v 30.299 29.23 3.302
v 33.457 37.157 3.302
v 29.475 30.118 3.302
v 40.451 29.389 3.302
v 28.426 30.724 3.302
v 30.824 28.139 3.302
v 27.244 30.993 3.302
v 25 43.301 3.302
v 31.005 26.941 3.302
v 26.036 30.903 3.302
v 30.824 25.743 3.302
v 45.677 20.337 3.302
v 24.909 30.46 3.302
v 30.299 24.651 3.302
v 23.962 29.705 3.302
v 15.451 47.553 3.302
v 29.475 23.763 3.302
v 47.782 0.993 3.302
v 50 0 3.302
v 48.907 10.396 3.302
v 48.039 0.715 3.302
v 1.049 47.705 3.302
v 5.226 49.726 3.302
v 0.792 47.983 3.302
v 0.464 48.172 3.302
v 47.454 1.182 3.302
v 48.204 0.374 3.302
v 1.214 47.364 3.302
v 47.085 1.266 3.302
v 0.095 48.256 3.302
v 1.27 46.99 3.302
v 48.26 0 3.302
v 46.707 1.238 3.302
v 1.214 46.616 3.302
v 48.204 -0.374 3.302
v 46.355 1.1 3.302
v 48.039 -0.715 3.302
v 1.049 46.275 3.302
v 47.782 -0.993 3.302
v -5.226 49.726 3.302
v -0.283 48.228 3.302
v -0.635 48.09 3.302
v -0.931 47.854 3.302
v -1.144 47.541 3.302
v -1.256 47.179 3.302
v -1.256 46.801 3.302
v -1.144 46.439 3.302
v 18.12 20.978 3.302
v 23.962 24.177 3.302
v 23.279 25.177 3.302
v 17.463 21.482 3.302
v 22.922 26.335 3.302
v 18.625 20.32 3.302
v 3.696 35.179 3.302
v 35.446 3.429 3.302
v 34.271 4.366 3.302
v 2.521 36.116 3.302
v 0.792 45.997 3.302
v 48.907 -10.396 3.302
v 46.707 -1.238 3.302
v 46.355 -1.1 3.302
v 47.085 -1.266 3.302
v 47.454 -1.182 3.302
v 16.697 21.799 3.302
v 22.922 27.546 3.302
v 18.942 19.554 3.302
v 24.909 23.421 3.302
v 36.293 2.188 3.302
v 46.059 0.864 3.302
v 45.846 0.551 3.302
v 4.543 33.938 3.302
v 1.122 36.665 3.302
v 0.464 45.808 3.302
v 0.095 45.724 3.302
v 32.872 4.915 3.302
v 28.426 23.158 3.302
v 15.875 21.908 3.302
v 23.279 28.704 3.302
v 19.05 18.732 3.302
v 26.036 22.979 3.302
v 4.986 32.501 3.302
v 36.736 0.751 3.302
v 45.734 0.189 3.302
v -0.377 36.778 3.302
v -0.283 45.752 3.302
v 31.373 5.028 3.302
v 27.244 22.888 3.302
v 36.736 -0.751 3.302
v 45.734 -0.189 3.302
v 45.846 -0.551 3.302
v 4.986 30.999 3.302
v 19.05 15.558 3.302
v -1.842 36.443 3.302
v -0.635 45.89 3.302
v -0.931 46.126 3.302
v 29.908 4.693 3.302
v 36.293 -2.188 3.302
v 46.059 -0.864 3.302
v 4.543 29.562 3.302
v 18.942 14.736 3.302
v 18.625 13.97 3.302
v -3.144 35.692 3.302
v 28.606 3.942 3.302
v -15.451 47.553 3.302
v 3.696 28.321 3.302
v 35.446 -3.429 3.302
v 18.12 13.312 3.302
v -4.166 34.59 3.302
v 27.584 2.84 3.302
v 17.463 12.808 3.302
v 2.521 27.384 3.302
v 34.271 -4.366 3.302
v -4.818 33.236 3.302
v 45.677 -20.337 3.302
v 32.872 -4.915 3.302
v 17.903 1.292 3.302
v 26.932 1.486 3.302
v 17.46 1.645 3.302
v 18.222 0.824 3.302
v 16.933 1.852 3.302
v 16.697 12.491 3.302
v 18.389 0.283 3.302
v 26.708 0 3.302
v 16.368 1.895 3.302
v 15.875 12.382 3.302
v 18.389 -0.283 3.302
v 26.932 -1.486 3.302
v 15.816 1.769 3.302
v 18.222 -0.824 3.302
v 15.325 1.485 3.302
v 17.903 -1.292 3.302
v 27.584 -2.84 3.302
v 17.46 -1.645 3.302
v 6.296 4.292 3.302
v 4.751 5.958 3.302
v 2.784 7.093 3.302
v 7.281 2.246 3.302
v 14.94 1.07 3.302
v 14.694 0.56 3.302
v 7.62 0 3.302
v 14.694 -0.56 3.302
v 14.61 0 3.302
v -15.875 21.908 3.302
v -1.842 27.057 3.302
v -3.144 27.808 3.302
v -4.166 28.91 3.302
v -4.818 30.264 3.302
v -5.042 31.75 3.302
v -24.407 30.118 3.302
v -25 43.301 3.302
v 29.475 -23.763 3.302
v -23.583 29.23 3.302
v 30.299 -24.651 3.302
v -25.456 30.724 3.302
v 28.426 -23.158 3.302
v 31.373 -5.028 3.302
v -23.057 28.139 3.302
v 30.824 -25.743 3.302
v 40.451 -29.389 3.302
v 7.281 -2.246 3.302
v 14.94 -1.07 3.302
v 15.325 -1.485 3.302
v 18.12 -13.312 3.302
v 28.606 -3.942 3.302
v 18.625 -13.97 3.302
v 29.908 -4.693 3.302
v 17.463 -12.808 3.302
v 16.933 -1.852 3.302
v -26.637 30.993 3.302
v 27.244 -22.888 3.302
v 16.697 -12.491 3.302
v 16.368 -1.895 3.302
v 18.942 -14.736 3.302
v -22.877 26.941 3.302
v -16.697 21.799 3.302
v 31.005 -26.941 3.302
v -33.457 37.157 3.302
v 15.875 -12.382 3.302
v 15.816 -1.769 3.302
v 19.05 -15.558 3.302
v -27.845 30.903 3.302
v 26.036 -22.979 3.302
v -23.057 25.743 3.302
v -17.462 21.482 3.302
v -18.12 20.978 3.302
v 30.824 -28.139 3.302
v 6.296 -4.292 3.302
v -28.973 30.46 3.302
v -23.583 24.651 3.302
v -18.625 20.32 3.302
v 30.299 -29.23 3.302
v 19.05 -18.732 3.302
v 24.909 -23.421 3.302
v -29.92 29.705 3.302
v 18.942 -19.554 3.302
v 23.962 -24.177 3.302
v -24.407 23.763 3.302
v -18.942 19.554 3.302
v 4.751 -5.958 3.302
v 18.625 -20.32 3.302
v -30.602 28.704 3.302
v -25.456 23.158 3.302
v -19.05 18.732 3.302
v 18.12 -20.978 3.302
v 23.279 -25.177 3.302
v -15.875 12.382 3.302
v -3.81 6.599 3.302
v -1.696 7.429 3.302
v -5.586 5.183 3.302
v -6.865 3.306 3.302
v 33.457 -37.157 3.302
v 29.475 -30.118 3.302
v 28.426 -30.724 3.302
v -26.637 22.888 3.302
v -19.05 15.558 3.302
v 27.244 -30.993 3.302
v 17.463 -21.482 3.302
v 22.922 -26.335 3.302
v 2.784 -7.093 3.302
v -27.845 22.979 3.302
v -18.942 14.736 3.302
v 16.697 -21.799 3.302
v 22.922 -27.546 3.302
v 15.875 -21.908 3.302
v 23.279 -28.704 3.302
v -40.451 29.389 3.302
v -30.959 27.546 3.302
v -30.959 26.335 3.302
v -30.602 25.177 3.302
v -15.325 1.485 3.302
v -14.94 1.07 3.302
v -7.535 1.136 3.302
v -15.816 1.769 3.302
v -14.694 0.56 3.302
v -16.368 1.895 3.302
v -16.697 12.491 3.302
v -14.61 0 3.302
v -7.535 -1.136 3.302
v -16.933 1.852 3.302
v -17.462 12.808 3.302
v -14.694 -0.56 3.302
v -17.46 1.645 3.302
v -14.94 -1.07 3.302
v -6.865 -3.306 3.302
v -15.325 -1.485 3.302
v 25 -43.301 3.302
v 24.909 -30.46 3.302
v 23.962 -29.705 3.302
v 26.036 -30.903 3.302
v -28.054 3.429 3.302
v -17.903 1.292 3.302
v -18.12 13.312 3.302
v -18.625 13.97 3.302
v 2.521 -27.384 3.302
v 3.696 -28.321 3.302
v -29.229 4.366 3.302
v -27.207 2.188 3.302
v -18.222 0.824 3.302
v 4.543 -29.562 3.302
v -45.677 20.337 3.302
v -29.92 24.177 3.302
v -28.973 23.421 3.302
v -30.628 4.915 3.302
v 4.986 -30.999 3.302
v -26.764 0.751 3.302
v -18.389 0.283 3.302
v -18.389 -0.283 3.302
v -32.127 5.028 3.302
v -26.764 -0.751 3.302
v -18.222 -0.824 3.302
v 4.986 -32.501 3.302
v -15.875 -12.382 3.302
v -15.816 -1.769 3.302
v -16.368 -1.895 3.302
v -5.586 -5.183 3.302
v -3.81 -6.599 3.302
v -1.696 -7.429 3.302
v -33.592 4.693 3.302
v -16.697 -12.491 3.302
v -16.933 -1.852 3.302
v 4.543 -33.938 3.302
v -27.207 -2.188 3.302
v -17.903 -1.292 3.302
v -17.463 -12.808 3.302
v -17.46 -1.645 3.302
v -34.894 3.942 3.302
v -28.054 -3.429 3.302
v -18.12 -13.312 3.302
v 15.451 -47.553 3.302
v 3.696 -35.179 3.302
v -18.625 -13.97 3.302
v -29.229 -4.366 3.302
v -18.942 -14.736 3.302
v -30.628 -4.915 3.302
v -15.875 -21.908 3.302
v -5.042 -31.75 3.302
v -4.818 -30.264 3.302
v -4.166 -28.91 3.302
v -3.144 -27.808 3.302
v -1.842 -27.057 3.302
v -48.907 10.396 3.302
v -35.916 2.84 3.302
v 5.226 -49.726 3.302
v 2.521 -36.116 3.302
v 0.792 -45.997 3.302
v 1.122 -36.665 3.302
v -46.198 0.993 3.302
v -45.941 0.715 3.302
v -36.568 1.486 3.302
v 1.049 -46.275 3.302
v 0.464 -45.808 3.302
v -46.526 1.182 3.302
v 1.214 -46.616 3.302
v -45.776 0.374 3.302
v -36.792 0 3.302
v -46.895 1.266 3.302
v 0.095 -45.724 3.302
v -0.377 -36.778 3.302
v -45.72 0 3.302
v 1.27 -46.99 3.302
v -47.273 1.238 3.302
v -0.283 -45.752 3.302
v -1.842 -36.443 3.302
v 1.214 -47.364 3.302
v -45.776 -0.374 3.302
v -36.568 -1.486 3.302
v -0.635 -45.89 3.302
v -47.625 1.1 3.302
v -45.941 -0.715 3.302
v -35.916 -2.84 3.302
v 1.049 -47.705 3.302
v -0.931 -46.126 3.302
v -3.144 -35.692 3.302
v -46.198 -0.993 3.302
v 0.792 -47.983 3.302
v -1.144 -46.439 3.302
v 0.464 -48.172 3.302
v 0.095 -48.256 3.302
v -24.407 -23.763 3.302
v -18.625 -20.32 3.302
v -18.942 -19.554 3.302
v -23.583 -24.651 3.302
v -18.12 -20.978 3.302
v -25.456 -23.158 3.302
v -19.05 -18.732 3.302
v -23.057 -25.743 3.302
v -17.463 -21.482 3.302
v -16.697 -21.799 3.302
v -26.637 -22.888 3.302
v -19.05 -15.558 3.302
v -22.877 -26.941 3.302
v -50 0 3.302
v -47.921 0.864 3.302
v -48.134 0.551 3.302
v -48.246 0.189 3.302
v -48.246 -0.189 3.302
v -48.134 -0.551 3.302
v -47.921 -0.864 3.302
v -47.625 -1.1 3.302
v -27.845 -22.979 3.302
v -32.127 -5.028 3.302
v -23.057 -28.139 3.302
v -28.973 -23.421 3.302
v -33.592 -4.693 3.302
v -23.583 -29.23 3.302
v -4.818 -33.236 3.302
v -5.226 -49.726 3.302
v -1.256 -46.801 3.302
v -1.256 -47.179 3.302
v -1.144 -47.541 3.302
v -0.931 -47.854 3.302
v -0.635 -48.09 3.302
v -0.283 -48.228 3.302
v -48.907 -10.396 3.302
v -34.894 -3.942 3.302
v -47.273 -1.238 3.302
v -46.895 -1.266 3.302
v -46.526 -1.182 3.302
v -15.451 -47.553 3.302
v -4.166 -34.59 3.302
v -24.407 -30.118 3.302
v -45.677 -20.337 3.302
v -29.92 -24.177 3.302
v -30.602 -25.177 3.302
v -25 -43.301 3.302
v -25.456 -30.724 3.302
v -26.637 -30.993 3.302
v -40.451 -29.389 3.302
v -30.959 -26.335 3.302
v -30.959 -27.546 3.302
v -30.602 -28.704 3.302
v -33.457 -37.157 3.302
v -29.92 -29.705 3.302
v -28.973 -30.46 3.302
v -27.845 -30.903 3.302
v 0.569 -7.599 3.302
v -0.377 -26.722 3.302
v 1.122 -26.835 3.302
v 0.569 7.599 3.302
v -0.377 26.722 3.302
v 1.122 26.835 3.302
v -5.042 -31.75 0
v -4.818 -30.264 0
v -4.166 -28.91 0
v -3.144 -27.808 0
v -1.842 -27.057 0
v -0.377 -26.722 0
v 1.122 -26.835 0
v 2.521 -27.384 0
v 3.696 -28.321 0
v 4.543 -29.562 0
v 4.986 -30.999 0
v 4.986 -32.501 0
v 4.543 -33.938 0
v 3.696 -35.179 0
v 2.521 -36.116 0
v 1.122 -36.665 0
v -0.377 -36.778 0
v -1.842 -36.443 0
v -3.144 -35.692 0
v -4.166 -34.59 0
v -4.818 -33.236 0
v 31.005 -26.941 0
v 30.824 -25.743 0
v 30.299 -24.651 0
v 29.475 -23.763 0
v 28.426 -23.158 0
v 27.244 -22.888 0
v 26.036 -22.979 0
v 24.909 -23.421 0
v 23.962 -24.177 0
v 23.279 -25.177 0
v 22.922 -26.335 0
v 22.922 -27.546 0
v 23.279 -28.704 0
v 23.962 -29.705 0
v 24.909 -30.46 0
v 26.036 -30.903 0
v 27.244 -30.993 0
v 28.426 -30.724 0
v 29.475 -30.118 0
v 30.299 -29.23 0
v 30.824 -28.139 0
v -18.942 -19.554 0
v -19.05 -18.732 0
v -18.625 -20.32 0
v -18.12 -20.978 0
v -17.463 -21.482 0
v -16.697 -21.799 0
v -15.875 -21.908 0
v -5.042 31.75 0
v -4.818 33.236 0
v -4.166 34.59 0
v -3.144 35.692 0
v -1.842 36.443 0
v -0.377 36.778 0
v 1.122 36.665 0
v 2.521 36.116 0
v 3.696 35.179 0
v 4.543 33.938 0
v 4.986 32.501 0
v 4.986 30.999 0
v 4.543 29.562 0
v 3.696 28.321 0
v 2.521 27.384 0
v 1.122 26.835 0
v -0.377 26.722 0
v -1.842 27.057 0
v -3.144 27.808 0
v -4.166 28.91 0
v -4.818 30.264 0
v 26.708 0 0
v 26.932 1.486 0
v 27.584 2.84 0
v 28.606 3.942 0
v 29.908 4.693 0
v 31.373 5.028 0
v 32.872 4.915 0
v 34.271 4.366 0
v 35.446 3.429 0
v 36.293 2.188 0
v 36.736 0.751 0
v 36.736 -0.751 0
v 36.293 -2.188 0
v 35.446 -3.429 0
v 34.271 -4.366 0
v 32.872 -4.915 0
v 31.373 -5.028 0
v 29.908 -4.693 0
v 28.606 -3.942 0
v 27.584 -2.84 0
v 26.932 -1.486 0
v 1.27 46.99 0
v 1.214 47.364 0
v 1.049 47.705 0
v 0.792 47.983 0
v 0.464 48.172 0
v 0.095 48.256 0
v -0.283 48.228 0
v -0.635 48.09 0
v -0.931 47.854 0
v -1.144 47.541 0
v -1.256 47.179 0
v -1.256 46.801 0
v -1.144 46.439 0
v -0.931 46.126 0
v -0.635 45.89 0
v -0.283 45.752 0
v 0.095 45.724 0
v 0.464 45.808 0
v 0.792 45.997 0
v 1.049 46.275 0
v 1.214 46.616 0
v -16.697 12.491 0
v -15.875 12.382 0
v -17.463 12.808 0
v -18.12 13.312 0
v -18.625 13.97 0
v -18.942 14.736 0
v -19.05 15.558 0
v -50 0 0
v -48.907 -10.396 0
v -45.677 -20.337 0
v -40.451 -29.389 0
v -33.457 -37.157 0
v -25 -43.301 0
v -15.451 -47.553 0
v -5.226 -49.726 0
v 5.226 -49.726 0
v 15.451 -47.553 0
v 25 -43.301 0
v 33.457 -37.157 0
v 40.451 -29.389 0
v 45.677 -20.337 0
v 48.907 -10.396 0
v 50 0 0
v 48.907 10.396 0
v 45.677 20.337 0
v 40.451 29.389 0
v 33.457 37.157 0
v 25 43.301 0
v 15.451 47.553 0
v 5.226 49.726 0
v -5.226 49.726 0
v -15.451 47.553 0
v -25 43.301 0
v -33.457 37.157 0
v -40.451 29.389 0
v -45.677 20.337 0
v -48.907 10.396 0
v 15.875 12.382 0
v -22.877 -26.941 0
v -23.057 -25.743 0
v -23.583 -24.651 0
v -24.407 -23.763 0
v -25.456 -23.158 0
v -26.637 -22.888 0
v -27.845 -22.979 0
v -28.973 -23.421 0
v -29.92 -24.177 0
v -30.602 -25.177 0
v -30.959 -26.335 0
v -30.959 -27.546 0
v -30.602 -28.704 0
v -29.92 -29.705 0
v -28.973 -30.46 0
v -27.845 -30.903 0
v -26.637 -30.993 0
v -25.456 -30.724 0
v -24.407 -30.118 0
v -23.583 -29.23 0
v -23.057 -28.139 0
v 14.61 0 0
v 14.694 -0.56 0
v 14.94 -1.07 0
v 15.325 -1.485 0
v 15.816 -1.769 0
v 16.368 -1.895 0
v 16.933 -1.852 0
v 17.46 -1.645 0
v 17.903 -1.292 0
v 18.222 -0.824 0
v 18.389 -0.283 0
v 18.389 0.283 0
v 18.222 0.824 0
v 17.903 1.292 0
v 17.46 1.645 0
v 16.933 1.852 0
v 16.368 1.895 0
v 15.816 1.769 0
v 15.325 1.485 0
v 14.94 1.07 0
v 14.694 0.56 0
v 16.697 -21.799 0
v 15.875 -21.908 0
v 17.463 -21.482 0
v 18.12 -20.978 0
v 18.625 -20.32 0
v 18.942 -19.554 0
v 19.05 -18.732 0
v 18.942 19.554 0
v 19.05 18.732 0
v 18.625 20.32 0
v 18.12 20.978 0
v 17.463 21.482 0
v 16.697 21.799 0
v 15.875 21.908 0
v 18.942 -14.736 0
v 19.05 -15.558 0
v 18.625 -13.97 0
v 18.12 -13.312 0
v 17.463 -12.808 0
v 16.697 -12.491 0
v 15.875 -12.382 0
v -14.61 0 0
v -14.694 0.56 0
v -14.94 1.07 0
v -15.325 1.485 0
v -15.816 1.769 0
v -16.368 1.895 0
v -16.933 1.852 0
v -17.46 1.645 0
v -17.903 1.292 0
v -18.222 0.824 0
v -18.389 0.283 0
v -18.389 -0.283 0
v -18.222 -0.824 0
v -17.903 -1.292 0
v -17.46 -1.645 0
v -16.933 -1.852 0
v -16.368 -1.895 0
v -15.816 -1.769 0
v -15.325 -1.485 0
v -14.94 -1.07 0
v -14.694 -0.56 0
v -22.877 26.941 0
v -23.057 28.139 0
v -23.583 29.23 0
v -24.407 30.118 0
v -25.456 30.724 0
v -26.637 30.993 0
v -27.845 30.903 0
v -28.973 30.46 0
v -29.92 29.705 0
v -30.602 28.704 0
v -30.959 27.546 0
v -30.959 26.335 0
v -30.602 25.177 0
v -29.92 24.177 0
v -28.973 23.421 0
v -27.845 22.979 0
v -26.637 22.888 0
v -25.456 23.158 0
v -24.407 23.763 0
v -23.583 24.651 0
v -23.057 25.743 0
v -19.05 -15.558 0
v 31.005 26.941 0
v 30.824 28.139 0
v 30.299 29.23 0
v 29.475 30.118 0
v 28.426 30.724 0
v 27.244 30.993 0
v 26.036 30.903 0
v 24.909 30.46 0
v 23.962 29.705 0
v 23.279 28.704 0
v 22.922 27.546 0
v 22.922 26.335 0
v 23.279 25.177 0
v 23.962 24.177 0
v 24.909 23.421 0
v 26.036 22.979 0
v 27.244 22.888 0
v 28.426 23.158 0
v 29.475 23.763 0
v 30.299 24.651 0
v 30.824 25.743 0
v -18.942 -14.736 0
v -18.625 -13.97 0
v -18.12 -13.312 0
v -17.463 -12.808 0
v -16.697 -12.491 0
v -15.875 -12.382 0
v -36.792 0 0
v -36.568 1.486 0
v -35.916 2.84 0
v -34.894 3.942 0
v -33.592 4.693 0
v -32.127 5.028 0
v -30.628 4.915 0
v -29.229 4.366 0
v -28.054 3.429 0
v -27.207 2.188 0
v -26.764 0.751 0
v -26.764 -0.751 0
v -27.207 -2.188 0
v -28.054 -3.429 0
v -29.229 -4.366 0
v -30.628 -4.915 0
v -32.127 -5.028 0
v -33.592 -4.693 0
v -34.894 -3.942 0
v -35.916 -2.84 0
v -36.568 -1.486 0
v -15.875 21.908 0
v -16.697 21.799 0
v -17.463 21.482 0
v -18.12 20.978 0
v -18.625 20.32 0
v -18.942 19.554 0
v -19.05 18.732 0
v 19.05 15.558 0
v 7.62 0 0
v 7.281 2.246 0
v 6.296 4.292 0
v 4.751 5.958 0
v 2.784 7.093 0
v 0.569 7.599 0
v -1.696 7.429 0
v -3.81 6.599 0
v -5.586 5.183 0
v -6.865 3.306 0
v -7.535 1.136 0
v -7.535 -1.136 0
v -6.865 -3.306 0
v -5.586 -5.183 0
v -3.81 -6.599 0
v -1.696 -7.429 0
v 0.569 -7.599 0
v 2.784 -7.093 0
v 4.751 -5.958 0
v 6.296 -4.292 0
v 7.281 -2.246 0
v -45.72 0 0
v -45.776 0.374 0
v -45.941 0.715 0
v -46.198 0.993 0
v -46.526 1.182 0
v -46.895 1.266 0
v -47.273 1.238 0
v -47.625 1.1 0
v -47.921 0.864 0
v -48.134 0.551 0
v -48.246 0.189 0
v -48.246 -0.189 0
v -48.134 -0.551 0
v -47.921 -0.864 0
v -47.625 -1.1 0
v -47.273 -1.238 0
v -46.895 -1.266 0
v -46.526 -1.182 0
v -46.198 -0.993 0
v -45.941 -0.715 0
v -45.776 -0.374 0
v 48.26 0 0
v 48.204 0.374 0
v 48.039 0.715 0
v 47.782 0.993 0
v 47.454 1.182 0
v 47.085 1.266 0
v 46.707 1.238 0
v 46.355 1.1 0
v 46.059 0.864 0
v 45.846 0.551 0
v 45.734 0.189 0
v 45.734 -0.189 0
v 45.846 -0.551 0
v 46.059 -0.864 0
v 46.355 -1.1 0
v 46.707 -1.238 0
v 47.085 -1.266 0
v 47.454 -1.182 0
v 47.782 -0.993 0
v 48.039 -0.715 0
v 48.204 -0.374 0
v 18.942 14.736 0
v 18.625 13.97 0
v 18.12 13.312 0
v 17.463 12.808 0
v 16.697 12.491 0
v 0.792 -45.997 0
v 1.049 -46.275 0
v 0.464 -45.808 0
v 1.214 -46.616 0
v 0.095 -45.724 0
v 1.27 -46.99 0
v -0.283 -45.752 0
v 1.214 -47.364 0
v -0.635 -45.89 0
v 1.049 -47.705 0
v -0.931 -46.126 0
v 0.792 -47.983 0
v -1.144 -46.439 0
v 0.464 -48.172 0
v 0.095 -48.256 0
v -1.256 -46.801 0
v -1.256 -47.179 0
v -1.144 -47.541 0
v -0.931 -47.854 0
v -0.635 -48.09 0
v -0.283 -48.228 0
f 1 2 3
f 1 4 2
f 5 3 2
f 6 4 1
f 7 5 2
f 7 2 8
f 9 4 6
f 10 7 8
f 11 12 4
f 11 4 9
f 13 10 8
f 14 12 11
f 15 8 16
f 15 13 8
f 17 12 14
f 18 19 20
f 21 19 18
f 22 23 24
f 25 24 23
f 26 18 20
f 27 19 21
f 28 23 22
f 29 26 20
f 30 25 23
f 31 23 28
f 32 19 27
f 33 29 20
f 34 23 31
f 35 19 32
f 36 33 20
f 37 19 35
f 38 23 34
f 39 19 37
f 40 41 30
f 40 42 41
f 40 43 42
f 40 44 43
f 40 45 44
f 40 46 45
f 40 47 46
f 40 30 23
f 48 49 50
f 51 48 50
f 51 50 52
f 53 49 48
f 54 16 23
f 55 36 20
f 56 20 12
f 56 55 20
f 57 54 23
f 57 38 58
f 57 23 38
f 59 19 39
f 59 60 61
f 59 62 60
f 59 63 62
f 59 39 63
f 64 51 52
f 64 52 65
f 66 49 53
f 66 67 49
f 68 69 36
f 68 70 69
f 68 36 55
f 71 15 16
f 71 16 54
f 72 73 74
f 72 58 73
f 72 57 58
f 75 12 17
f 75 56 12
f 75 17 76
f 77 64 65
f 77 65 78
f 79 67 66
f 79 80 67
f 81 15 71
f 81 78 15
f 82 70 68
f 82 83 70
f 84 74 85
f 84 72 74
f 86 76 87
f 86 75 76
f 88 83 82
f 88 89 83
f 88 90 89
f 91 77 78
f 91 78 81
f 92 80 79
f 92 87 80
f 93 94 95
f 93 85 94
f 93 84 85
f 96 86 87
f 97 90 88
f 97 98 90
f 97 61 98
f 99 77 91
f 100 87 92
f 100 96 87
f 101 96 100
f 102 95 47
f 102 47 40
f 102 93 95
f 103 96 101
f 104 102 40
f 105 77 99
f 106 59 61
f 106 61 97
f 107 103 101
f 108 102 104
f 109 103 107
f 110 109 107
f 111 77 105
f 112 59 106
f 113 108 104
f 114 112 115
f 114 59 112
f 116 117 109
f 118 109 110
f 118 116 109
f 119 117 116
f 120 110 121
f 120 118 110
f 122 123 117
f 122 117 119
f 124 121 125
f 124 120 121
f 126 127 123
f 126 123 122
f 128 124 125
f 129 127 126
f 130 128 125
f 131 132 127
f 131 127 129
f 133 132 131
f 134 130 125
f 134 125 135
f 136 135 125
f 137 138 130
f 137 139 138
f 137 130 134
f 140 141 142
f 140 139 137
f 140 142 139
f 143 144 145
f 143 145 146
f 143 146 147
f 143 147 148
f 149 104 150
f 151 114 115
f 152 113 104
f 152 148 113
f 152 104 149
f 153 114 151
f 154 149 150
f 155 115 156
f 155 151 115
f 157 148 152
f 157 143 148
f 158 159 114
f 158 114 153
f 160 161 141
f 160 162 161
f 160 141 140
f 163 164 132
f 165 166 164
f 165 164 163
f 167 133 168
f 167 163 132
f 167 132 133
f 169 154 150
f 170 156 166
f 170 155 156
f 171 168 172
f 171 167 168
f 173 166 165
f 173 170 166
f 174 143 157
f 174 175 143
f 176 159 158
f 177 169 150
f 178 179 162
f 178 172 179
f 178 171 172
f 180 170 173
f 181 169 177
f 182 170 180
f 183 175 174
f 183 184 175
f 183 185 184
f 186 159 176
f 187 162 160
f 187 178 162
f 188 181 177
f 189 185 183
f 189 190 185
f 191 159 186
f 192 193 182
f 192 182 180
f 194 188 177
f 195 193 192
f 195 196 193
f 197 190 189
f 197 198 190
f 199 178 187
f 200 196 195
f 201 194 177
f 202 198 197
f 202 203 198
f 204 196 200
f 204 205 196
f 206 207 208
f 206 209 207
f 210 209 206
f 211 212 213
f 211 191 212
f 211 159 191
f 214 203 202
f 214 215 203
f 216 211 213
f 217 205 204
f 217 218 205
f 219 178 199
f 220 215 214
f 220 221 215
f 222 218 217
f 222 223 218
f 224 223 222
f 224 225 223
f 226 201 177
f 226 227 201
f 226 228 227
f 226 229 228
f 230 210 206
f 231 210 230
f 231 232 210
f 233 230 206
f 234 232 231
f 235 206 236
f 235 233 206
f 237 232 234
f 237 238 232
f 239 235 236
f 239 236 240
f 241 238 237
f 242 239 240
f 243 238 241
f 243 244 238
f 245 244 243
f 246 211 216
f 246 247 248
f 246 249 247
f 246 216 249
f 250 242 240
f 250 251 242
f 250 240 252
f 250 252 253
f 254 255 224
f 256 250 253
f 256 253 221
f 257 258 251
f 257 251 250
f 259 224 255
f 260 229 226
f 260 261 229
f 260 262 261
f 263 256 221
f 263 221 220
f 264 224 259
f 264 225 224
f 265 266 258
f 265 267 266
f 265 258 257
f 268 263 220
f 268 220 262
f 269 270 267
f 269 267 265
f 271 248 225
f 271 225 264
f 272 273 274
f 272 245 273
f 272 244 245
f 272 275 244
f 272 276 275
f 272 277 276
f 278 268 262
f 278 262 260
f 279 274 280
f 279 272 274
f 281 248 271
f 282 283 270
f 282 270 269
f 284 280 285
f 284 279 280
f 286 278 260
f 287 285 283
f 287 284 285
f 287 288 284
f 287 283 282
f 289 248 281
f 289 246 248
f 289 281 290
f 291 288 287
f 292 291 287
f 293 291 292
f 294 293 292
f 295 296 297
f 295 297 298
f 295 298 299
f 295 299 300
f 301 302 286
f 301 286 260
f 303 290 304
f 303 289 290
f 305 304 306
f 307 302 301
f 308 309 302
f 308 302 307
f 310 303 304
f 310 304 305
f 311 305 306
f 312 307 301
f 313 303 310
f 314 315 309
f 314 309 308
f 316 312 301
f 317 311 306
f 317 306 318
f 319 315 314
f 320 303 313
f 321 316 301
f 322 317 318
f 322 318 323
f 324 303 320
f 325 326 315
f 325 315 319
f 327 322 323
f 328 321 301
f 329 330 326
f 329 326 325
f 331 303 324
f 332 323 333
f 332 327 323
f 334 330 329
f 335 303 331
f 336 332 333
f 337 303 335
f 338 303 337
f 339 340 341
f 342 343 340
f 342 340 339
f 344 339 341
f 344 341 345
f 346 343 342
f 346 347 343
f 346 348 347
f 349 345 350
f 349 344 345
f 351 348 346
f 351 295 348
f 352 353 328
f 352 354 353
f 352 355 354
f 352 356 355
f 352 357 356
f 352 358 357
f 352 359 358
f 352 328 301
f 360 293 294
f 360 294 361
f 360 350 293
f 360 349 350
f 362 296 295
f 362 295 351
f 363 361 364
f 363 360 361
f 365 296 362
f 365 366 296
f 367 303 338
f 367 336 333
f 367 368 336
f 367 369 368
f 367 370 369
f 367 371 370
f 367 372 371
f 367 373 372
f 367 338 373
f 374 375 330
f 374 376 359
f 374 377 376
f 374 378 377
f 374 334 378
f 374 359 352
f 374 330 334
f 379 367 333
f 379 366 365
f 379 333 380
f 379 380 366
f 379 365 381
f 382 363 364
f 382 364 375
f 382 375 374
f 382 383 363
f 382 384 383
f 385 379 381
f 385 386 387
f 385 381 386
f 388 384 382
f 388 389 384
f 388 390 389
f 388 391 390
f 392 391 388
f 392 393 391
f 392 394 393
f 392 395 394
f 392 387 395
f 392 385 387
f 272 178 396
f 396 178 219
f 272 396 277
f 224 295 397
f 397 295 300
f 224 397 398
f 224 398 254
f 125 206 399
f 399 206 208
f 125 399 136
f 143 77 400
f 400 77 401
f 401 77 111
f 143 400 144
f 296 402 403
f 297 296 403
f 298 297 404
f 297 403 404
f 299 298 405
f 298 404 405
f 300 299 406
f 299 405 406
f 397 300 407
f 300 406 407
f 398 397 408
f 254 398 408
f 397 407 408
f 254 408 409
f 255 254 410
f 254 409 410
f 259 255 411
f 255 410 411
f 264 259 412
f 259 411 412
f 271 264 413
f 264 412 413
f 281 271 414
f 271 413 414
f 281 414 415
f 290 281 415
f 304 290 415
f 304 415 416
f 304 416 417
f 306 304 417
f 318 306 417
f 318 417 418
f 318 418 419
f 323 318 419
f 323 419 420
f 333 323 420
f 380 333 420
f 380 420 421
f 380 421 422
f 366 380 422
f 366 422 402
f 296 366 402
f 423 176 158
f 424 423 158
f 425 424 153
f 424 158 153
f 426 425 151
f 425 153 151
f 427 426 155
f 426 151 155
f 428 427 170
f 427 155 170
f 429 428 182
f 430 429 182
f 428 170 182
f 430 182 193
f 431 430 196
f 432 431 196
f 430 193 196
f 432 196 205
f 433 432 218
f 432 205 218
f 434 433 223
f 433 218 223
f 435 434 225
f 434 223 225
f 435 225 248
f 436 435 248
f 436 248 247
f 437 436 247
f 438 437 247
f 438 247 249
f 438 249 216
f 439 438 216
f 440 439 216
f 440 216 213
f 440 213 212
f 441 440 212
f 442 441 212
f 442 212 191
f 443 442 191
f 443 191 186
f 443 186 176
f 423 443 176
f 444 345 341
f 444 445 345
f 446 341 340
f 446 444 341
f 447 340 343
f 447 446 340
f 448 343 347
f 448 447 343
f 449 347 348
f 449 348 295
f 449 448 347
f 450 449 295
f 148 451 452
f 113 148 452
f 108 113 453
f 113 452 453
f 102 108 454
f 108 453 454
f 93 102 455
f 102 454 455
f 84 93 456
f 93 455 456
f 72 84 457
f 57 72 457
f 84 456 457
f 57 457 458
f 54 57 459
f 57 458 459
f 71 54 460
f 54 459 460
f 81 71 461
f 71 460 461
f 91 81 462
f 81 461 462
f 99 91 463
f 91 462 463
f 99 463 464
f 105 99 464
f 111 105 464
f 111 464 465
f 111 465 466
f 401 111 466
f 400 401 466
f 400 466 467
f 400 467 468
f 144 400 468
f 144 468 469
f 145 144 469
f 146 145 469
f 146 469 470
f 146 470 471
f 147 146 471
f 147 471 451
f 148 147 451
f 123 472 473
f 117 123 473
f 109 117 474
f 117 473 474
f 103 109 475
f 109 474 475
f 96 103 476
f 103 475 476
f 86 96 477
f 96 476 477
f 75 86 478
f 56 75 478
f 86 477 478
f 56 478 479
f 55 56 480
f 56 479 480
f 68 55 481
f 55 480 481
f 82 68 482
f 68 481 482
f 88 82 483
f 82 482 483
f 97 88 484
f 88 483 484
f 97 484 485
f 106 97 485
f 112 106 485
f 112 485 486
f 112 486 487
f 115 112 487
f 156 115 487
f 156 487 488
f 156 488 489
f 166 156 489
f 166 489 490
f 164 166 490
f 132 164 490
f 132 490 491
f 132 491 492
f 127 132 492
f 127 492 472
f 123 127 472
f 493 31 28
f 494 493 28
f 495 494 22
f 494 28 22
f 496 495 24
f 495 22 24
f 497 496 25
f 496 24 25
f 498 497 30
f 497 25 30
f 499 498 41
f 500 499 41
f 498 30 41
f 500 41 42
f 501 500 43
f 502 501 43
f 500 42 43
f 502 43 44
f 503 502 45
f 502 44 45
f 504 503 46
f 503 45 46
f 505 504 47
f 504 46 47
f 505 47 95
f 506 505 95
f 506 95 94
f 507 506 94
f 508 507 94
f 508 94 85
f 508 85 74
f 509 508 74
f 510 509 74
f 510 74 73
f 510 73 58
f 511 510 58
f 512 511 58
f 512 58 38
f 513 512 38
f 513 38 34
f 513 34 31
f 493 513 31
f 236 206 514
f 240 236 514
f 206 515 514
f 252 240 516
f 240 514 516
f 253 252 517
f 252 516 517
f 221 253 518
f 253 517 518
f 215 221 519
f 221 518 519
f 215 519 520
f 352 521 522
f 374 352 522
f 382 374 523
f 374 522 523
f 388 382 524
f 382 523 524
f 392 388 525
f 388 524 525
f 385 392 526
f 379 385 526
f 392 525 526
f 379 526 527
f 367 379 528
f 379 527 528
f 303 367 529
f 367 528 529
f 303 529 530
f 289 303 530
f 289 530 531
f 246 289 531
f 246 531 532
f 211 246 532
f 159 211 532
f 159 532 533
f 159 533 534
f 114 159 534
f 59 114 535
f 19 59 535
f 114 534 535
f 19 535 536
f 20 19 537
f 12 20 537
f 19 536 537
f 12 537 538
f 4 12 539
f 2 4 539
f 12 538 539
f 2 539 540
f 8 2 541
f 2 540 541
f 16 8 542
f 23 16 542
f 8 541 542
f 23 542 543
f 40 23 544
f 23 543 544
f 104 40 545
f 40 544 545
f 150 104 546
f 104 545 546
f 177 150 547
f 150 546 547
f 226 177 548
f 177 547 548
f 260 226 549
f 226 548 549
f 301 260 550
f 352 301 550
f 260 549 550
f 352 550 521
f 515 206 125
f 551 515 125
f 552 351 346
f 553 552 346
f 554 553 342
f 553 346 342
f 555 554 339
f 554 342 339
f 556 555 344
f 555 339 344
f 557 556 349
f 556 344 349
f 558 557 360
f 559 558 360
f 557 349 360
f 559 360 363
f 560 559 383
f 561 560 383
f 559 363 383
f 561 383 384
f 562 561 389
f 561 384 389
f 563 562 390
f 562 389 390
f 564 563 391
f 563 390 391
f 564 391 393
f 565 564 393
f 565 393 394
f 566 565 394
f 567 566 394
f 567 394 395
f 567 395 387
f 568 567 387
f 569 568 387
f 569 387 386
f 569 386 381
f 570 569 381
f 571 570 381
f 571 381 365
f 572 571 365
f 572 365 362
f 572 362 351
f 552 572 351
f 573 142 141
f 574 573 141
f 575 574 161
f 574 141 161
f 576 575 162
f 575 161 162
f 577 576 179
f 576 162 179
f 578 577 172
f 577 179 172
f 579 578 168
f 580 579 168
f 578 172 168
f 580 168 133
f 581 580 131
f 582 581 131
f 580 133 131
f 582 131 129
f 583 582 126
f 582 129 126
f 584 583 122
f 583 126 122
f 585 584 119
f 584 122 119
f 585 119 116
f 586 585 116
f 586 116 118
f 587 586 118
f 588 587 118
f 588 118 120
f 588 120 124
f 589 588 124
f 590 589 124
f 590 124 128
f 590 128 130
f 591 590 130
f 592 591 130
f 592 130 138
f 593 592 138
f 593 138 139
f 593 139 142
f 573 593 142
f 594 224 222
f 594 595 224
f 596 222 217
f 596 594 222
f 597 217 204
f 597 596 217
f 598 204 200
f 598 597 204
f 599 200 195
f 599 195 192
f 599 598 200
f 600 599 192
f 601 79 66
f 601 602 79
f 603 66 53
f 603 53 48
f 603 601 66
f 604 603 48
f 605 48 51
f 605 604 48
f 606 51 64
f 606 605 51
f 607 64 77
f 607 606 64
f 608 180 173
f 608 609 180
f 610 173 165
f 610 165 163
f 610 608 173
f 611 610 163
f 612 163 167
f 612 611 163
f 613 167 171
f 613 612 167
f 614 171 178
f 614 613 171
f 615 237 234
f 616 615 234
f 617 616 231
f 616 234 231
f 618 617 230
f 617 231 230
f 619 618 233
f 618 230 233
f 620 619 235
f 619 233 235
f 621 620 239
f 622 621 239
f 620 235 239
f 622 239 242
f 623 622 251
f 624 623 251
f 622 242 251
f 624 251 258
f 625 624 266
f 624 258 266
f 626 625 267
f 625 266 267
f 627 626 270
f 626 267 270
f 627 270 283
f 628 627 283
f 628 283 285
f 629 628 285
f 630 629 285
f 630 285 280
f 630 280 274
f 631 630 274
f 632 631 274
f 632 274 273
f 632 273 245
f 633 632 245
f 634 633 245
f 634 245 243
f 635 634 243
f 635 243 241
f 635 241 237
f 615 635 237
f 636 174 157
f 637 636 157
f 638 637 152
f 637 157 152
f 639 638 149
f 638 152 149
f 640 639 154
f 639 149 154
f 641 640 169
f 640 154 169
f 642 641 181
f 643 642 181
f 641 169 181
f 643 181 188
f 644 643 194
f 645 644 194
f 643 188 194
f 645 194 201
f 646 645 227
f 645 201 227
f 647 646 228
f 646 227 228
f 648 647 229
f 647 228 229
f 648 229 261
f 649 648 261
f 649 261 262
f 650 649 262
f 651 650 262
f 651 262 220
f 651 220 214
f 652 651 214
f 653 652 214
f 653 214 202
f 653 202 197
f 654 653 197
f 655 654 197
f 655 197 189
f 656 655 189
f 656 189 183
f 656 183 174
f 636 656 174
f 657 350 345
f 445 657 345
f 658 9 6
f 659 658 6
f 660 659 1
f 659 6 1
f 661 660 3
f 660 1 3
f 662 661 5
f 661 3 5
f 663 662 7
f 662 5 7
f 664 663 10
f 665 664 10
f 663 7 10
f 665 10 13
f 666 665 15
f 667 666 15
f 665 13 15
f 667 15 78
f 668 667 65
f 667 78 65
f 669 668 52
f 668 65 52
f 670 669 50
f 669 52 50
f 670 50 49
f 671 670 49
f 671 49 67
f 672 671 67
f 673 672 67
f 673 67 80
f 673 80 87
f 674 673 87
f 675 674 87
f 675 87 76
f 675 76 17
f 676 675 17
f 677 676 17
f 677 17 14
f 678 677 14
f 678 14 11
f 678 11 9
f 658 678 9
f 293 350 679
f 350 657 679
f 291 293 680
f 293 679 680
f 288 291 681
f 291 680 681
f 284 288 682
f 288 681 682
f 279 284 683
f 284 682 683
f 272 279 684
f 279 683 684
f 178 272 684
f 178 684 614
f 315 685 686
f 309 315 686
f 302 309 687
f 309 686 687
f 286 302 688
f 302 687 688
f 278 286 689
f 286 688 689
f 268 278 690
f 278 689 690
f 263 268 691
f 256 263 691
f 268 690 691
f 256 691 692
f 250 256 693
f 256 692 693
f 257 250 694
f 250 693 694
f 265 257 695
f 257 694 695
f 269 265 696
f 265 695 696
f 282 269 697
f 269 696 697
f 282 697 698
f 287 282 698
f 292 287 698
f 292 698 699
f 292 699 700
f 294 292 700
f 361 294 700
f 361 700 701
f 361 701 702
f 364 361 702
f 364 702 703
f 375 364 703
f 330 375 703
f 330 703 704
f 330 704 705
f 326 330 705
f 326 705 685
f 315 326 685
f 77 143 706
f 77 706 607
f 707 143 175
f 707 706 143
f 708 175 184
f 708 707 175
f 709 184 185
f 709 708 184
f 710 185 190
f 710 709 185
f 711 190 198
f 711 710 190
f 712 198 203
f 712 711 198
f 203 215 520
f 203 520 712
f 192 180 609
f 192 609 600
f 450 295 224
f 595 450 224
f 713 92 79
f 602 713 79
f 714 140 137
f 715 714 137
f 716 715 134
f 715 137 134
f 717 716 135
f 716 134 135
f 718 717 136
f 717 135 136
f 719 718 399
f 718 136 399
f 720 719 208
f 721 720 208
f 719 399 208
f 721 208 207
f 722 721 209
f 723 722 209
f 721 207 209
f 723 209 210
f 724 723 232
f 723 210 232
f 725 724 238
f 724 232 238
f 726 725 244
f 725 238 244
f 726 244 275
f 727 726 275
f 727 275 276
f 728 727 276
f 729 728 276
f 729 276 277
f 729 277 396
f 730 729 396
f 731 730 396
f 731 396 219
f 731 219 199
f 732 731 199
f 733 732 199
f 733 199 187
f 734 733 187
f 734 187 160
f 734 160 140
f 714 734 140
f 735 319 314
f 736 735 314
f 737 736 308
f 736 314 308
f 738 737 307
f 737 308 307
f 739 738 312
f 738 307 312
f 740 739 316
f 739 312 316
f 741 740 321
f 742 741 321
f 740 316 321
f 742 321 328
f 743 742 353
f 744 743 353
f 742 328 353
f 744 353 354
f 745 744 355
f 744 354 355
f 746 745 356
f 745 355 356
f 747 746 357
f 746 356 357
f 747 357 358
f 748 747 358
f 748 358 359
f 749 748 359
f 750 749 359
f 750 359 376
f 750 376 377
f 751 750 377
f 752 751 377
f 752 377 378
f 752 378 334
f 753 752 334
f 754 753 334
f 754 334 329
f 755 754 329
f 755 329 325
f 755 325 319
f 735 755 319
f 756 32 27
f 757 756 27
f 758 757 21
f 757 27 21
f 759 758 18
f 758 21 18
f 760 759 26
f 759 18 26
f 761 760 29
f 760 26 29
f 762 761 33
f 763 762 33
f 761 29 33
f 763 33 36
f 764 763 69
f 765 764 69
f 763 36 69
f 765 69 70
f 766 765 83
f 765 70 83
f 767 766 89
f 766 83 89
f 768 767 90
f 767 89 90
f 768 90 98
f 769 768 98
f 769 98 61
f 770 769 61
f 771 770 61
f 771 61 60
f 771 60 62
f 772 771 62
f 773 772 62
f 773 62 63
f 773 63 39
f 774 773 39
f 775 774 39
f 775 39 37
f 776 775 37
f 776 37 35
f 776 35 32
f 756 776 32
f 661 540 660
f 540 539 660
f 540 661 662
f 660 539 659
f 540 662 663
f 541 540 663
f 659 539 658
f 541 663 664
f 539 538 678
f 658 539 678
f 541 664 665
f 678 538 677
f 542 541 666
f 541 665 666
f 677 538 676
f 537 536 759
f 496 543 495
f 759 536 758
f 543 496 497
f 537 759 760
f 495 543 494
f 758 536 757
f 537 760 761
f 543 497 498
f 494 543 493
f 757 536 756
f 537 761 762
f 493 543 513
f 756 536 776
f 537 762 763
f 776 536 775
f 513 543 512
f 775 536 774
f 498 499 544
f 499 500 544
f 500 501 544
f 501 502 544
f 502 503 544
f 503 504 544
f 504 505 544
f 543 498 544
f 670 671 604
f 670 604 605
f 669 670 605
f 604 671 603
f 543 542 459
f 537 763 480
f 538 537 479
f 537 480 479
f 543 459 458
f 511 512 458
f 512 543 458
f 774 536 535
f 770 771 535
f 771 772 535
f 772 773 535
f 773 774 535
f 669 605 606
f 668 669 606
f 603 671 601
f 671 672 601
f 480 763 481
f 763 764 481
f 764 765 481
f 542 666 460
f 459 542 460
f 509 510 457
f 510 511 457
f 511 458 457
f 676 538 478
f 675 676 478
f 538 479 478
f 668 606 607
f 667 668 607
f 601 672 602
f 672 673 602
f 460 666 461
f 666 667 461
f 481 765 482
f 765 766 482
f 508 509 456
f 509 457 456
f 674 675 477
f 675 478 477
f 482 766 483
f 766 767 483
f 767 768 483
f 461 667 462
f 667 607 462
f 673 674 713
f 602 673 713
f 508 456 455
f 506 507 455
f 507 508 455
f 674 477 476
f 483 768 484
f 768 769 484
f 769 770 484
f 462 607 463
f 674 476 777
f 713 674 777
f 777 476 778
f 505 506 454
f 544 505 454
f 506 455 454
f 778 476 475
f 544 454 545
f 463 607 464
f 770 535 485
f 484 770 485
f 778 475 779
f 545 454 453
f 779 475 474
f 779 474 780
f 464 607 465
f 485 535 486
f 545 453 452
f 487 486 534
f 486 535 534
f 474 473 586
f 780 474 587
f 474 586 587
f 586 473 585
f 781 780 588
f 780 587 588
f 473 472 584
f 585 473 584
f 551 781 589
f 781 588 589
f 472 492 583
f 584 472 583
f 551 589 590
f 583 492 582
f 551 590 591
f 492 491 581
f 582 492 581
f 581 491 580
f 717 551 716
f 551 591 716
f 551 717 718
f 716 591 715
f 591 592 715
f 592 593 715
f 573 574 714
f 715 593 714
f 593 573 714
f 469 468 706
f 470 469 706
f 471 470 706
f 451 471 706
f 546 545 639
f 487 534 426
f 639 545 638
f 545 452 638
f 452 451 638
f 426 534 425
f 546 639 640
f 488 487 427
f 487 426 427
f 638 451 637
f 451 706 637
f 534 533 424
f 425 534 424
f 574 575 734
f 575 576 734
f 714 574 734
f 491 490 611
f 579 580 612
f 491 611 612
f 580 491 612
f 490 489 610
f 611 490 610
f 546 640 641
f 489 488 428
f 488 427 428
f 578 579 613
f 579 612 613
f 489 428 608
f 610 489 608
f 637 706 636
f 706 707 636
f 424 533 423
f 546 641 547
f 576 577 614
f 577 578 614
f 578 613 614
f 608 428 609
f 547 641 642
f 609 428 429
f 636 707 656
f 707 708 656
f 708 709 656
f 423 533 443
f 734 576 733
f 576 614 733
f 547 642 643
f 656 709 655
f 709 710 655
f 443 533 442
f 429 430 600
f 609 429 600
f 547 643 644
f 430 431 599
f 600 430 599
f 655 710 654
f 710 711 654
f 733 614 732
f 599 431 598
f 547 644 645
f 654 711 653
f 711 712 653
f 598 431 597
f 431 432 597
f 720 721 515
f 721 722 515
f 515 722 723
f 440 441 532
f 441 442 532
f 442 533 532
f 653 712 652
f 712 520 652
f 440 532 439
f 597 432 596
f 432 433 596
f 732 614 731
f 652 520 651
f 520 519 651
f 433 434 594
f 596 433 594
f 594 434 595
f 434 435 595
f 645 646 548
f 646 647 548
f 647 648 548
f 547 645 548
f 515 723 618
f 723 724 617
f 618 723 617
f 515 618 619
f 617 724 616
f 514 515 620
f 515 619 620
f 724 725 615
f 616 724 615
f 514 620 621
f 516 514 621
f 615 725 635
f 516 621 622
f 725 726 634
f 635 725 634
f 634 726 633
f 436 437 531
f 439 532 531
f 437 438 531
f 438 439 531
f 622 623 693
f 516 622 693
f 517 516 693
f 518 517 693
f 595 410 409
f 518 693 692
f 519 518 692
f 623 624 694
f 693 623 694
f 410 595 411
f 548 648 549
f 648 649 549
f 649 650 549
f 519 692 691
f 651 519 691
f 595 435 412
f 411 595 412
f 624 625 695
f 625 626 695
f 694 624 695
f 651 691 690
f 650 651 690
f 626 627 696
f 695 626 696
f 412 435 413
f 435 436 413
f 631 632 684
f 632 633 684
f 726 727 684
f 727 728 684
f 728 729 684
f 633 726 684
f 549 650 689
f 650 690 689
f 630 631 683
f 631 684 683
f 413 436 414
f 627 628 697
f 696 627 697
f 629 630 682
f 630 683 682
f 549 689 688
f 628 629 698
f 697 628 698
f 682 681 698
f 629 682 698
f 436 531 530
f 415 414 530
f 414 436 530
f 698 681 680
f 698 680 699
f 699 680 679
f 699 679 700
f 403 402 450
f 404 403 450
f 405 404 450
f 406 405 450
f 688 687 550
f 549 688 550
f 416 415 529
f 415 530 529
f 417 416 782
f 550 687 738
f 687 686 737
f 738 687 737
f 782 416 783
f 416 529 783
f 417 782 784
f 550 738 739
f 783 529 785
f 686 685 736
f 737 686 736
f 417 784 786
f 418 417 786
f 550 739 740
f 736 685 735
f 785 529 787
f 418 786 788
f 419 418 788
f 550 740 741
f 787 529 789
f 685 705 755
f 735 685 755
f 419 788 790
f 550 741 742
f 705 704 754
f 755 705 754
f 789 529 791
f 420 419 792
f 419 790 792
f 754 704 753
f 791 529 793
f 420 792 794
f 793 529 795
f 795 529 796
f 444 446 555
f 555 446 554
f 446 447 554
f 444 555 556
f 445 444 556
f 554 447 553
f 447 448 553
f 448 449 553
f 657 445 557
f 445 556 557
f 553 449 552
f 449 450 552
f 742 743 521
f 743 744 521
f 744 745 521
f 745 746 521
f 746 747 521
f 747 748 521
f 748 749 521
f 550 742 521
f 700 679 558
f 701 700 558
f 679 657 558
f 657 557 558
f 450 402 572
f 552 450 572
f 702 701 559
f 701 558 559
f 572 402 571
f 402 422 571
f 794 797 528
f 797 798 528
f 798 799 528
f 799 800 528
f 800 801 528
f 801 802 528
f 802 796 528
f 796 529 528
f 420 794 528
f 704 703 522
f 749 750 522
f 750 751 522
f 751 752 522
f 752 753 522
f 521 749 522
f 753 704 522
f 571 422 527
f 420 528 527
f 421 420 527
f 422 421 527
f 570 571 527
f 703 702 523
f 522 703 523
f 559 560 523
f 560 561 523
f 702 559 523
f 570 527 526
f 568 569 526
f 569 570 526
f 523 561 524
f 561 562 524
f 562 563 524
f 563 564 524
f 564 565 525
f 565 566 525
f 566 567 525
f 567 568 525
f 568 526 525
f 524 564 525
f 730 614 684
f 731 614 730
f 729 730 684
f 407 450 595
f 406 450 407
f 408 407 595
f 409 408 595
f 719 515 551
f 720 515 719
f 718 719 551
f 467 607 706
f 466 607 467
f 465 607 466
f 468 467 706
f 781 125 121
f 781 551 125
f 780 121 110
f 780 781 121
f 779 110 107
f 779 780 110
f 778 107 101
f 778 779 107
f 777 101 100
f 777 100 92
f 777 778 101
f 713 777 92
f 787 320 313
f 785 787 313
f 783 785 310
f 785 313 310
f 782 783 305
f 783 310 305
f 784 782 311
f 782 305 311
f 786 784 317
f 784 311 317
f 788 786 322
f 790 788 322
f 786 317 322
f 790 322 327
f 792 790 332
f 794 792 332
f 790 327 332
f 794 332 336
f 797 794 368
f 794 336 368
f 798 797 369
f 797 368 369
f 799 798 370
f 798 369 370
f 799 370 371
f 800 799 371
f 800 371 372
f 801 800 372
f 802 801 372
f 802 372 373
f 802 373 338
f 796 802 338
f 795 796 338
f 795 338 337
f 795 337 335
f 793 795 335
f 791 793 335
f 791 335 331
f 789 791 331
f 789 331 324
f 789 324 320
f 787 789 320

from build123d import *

# Parameters (mm, degrees)
SKETCH_1_R              = 50
EXTRUDE_1_DEPTH         = 3.302
SKETCH_2_R              = 4.064
CUT_EXTRUDE_1_DEPTH     = 71.787733429
SKETCH_4_R              = 7.62
CUT_EXTRUDE_3_DEPTH     = 71.787733429
SKETCH_7_R              = 1.27
CUT_EXTRUDE_6_DEPTH     = 71.787733429
F_3_8_CLEARANCE_HOLE1_D = 10.0838
SKETCH11_R              = 1.9
CUT_EXTRUDE5_DEPTH      = 71.787733429
CIRPATTERN1_COUNT       = 2
SKETCH12_W              = 38.1
SKETCH12_H              = 9.525
CUT_EXTRUDE6_DEPTH      = 71.787733429
FILLET1_R               = 3.175
FILLET1_OF_MIRROR1_R    = 3.175


with BuildPart() as part:
    # 草图1 → 凸台-拉伸1 (new body)
    with BuildSketch(Plane.XY):
        with Locations(Location((0, 0, 0), (0, 0, 180))):
            Circle(SKETCH_1_R)
    extrude(amount=EXTRUDE_1_DEPTH)

    # 草图2 → 切除-拉伸1 (cut, through all)
    with BuildSketch(Plane.XY.offset(3.302)):
        with Locations((-26.940768363, 26.940768363)):
            Circle(SKETCH_2_R)
        with Locations((-26.940768363, -26.940768363)):
            Circle(SKETCH_2_R)
        with Locations((26.940768363, -26.940768363)):
            Circle(SKETCH_2_R)
        with Locations((26.940768363, 26.940768363)):
            Circle(SKETCH_2_R)
    extrude(amount=-CUT_EXTRUDE_1_DEPTH, mode=Mode.SUBTRACT)

    # 草图4 → 切除-拉伸3 (cut, through all)
    with BuildSketch(Plane.XY.offset(3.302)):
        Circle(SKETCH_4_R)
    extrude(amount=-CUT_EXTRUDE_3_DEPTH, mode=Mode.SUBTRACT)

    # 草图7 → 切除-拉伸6 (cut, through all)
    with BuildSketch(Plane.XY.offset(3.302)):
        with Locations((0, 46.99)):
            Circle(SKETCH_7_R)
        with Locations((46.99, 0)):
            Circle(SKETCH_7_R)
        with Locations((0, -46.99)):
            Circle(SKETCH_7_R)
        with Locations((-46.99, 0)):
            Circle(SKETCH_7_R)
    extrude(amount=-CUT_EXTRUDE_6_DEPTH, mode=Mode.SUBTRACT)

    # 3/8 Clearance Hole1 (through all)
    with Locations(Plane.XY.offset(3.302)):
        with Locations((0, 31.75), (-31.75, 0), (31.75, 0), (0, -31.75)):
            Hole(F_3_8_CLEARANCE_HOLE1_D / 2)

    # Sketch11 → Cut-Extrude5 (cut, through all)
    with BuildSketch(Plane.XY.offset(3.302)):
        with Locations((-16.51, 0)):
            Circle(SKETCH11_R)
    cut_extrude5 = extrude(amount=-CUT_EXTRUDE5_DEPTH, mode=Mode.SUBTRACT)

    # CirPattern1: Cut-Extrude5 ×2 about axis
    cirpattern1_axis = Axis((0, 0, 0), (0, 0, 1))
    for i in range(1, CIRPATTERN1_COUNT):
        add(cut_extrude5.rotate(cirpattern1_axis, i * 360 / CIRPATTERN1_COUNT), mode=Mode.SUBTRACT)

    # Sketch12 → Cut-Extrude6 (cut, through all)
    with BuildSketch(Plane.XY.offset(3.302)):
        with Locations((0, 17.145)):
            Rectangle(SKETCH12_W, SKETCH12_H)
    cut_extrude6 = extrude(amount=-CUT_EXTRUDE6_DEPTH, mode=Mode.SUBTRACT)

    # Fillet1
    fillet1_edges = [part.edges().sort_by_distance(p)[0] for p in [
        (19.05, 21.9075, 1.651),
        (19.05, 12.3825, 1.651),
        (-19.05, 12.3825, 1.651),
        (-19.05, 21.9075, 1.651),
    ]]
    fillet(fillet1_edges, radius=FILLET1_R)

    # Mirror1: Cut-Extrude6 across plane
    add(cut_extrude6.mirror(Plane.ZX), mode=Mode.SUBTRACT)

    # Fillet1 of Mirror1
    fillet1_of_mirror1_edges = [part.edges().sort_by_distance(p)[0] for p in [
        (19.05, -21.9075, 1.651),
        (19.05, -12.3825, 1.651),
        (-19.05, -12.3825, 1.651),
        (-19.05, -21.9075, 1.651),
    ]]
    fillet(fillet1_of_mirror1_edges, radius=FILLET1_OF_MIRROR1_R)


solid = part.part
